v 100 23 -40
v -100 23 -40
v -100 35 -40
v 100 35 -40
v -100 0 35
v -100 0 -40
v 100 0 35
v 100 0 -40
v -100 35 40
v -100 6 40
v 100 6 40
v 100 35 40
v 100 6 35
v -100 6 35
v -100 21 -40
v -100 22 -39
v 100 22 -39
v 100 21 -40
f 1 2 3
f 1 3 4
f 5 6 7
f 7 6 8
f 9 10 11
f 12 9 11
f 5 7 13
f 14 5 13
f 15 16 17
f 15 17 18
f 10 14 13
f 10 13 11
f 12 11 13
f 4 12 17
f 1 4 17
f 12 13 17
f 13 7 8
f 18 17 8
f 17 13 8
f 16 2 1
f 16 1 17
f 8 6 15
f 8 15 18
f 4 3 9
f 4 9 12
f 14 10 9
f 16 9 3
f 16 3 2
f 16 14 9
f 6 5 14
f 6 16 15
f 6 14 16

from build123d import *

# Parameters (mm, degrees)
SKETCH1_W           = 200
SKETCH1_H           = 80
BOSS_EXTRUDE1_DEPTH = 35
SKETCH2_W           = 5
SKETCH2_H           = 6
CUT_EXTRUDE1_DEPTH  = 201
CUT_EXTRUDE5_DEPTH  = 201


with BuildPart() as part:
    # Sketch1 → Boss-Extrude1 (new body)
    with BuildSketch(Plane(origin=(0, 0, 0), x_dir=(1, 0, 0), z_dir=(0, 1, 0))):
        Rectangle(SKETCH1_W, SKETCH1_H)
    extrude(amount=BOSS_EXTRUDE1_DEPTH)

    # Sketch2 → Cut-Extrude1 (cut, through all)
    with BuildSketch(Plane.ZY.offset(100)):
        with Locations((37.5, 3)):
            Rectangle(SKETCH2_W, SKETCH2_H)
    extrude(amount=-CUT_EXTRUDE1_DEPTH, mode=Mode.SUBTRACT)

    # Sketch6 → Cut-Extrude5 (cut, through all)
    with BuildSketch(Plane(origin=(100, 0, 0), x_dir=(0, 0, -1), z_dir=(1, 0, 0))):
        Polygon((40, 22), (40, 23), (39, 22), (40, 21), align=None)
    extrude(amount=-CUT_EXTRUDE5_DEPTH, mode=Mode.SUBTRACT)


solid = part.part
